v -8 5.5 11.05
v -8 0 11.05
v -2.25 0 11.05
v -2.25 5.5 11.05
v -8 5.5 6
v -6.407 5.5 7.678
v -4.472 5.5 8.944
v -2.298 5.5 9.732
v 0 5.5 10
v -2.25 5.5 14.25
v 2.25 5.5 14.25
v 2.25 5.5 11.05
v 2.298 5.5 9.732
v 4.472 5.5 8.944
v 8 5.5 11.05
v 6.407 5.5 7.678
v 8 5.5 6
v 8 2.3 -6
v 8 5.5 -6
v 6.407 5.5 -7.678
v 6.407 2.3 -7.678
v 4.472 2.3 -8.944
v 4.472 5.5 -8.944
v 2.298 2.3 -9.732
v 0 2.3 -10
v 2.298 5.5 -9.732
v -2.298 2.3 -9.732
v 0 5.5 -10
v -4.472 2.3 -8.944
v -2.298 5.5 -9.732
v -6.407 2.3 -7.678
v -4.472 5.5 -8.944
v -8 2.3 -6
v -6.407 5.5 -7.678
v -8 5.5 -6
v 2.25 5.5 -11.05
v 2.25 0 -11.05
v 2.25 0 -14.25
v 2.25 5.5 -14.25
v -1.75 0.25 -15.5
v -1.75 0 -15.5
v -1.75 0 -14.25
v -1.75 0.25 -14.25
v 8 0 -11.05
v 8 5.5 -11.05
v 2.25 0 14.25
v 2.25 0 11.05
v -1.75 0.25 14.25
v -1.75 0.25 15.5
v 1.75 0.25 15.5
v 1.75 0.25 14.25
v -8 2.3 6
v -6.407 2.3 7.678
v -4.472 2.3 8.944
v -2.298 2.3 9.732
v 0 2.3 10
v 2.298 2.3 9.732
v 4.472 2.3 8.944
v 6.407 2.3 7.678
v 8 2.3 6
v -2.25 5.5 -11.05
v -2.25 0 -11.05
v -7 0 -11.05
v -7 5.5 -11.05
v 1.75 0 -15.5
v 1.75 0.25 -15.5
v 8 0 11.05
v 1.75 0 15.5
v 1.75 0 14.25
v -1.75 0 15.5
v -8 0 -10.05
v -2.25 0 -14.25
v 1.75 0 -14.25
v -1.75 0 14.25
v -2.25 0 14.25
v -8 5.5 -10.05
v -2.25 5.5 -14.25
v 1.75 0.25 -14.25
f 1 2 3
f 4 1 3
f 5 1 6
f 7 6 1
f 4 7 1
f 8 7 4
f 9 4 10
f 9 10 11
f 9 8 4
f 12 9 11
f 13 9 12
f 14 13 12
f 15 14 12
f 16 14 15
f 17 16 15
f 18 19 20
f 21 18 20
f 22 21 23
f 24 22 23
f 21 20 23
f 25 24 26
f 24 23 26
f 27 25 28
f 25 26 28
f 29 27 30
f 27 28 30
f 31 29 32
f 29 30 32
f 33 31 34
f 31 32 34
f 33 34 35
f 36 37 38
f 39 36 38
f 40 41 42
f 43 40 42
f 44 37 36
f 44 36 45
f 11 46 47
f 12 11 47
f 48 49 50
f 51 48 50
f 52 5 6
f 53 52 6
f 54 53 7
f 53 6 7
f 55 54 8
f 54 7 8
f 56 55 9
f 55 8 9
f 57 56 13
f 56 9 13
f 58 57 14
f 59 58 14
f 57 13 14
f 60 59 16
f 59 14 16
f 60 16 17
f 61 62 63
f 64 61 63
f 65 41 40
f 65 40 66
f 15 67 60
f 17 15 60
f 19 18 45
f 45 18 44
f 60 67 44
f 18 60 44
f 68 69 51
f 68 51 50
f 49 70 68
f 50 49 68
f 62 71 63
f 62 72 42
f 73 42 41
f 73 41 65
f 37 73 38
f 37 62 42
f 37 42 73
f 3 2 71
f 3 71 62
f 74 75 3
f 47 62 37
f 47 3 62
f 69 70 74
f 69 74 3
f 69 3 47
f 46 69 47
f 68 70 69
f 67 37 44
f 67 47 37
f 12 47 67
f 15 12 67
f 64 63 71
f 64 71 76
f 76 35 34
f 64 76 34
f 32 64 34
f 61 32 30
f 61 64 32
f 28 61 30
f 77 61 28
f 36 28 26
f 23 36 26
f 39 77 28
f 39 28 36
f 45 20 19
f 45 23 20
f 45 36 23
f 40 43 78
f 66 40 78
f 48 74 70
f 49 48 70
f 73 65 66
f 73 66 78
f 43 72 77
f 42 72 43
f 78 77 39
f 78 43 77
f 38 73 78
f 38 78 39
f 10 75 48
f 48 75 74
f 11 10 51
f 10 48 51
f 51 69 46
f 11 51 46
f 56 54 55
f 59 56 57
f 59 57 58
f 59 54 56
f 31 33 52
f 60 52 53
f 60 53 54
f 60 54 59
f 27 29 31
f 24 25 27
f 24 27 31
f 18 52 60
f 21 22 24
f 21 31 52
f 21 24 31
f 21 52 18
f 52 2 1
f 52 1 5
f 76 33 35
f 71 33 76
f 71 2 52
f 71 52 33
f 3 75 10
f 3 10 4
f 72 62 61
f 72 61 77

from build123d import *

# Parameters (mm, degrees)
SKETCH1_W           = 5.75
SKETCH1_H           = 22.1
SKETCH1_W_2         = 4.5
SKETCH1_H_2         = 3.2
BOSS_EXTRUDE1_DEPTH = 5.5
SKETCH2_R           = 10
CUT_EXTRUDE1_DEPTH  = 3.2
CHAMFER1_SIZE       = 1
SKETCH3_W           = 3.5
SKETCH3_H           = 31
BOSS_EXTRUDE2_DEPTH = 0.25


with BuildPart() as part:
    # Sketch1 → Boss-Extrude1 (new body)
    with BuildSketch(Plane(origin=(0, 0, 0), x_dir=(1, 0, 0), z_dir=(0, 1, 0))):
        with Locations((-5.125, 0)):
            Rectangle(SKETCH1_W, SKETCH1_H)
        Rectangle(SKETCH1_W_2, SKETCH1_H)
        with Locations((0, 12.65)):
            Rectangle(SKETCH1_W_2, SKETCH1_H_2)
        with Locations((0, -12.65)):
            Rectangle(SKETCH1_W_2, SKETCH1_H_2)
        with Locations((5.125, 0)):
            Rectangle(SKETCH1_W, SKETCH1_H)
    extrude(amount=BOSS_EXTRUDE1_DEPTH)

    # Sketch2 → Cut-Extrude1 (cut)
    with BuildSketch(Plane(origin=(0, 5.5, 0), x_dir=(1, 0, 0), z_dir=(0, 1, 0))):
        Circle(SKETCH2_R)
    extrude(amount=-CUT_EXTRUDE1_DEPTH, mode=Mode.SUBTRACT)

    # Chamfer1
    chamfer1_edges = [part.edges().sort_by_distance(p)[0] for p in [
        (-8, 2.75, -11.05),
    ]]
    chamfer(chamfer1_edges, length=CHAMFER1_SIZE)

    # Sketch3 → Boss-Extrude2 (add)
    with BuildSketch(Plane.XZ):
        Rectangle(SKETCH3_W, SKETCH3_H)
    extrude(amount=-BOSS_EXTRUDE2_DEPTH)


solid = part.part
